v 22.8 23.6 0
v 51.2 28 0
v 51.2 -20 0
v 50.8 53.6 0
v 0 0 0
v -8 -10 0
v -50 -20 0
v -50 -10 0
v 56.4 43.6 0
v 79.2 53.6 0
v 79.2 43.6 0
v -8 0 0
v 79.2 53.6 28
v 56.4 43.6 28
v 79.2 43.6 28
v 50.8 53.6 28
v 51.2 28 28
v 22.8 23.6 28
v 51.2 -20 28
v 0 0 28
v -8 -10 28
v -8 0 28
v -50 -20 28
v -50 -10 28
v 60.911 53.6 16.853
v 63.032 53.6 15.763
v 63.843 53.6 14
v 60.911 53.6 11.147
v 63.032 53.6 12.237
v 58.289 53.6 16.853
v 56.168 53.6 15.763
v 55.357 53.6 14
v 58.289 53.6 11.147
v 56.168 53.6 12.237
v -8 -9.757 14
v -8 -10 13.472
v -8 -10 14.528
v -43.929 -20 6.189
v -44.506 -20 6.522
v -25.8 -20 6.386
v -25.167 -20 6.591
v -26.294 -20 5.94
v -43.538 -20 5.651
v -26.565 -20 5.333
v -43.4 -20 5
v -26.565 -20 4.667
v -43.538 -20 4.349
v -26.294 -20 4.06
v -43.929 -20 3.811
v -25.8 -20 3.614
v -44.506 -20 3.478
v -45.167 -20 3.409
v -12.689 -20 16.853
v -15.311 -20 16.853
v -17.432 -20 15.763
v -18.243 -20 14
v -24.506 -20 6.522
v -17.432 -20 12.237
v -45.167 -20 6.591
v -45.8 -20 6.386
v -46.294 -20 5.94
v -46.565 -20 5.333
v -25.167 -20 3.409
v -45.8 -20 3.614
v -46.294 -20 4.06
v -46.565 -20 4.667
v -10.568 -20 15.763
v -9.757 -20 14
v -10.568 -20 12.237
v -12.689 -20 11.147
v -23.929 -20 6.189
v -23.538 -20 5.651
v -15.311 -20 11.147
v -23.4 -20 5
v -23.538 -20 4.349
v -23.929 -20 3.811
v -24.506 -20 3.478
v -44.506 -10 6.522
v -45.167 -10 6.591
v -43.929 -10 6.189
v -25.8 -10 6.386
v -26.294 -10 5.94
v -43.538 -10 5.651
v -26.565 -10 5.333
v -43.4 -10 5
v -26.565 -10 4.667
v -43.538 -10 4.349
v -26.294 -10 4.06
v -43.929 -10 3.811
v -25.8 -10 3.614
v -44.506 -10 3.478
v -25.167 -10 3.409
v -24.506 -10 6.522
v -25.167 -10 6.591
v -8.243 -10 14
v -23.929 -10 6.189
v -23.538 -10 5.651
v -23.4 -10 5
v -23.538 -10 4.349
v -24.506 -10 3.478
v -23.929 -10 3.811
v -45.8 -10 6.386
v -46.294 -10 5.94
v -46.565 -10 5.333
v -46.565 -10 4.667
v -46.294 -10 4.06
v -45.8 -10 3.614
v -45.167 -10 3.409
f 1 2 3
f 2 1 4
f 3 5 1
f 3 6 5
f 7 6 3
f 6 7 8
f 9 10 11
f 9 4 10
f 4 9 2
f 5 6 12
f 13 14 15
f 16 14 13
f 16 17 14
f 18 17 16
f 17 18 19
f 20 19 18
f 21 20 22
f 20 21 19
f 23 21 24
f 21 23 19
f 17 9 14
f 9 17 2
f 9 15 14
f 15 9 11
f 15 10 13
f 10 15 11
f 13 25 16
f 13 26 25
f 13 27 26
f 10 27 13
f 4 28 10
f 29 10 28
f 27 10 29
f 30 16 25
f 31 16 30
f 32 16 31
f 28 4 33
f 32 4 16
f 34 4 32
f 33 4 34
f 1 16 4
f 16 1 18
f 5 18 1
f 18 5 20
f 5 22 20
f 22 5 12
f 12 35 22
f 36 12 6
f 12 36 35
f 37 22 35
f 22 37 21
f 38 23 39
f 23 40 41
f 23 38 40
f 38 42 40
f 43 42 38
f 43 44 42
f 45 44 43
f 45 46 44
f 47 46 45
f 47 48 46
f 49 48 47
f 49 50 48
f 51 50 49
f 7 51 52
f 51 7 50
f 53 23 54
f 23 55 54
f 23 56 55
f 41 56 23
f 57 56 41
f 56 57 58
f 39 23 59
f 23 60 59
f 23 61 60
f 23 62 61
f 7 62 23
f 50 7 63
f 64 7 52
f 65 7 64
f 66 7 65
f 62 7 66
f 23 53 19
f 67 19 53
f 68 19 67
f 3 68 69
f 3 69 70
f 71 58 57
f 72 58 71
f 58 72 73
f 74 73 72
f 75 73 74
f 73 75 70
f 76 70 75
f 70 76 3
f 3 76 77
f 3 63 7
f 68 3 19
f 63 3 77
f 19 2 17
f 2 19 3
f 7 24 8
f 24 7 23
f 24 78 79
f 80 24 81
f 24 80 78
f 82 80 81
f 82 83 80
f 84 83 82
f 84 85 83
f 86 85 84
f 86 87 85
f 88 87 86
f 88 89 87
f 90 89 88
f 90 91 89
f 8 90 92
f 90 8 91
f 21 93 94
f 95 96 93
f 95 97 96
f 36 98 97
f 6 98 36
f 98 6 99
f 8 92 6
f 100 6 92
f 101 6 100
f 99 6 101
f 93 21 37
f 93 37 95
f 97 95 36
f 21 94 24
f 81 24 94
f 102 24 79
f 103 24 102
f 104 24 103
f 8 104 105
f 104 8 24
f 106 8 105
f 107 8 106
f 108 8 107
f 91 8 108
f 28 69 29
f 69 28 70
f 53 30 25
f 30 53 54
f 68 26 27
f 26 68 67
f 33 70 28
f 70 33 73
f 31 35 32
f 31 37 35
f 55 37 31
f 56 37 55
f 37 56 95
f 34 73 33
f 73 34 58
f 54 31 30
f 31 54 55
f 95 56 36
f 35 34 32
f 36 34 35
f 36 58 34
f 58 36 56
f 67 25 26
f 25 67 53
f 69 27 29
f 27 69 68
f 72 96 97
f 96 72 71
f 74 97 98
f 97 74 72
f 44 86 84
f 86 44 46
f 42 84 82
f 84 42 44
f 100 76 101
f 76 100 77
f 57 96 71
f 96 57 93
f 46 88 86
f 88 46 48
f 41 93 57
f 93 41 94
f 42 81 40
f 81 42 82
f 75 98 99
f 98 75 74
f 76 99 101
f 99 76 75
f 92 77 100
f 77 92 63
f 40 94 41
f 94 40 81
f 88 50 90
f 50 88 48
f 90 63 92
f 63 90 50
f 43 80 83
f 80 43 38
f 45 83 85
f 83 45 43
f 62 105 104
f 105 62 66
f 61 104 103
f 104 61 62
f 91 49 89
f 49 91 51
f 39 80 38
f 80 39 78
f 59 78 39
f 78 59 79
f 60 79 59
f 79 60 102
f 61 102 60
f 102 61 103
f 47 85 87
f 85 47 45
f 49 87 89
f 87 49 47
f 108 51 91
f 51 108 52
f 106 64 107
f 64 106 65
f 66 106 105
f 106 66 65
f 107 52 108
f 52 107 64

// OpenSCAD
difference(){
union(){    
scale([2,2,2])
linear_extrude(height=14)
polygon([[25.6,-10],[25.6,14],[28.2,21.8],[39.6,21.8],[39.6,26.8],[25.4,26.8],[11.4,11.8],[0,0],[-4,0],[-4,-10]]);
translate([-50,-20,0])cube([50,10,28]);
}    
translate([6,0,14])rotate([0,0,135])
rotate([90,0,0])cylinder(d=6,h=200,center=true);
translate([-25,-4,5])rotate([90,0,0])
    cylinder(d=3.2,h=40,$fn=15);
translate([-45,-4,5])rotate([90,0,0])
    cylinder(d=3.2,h=40,$fn=15);    
}
